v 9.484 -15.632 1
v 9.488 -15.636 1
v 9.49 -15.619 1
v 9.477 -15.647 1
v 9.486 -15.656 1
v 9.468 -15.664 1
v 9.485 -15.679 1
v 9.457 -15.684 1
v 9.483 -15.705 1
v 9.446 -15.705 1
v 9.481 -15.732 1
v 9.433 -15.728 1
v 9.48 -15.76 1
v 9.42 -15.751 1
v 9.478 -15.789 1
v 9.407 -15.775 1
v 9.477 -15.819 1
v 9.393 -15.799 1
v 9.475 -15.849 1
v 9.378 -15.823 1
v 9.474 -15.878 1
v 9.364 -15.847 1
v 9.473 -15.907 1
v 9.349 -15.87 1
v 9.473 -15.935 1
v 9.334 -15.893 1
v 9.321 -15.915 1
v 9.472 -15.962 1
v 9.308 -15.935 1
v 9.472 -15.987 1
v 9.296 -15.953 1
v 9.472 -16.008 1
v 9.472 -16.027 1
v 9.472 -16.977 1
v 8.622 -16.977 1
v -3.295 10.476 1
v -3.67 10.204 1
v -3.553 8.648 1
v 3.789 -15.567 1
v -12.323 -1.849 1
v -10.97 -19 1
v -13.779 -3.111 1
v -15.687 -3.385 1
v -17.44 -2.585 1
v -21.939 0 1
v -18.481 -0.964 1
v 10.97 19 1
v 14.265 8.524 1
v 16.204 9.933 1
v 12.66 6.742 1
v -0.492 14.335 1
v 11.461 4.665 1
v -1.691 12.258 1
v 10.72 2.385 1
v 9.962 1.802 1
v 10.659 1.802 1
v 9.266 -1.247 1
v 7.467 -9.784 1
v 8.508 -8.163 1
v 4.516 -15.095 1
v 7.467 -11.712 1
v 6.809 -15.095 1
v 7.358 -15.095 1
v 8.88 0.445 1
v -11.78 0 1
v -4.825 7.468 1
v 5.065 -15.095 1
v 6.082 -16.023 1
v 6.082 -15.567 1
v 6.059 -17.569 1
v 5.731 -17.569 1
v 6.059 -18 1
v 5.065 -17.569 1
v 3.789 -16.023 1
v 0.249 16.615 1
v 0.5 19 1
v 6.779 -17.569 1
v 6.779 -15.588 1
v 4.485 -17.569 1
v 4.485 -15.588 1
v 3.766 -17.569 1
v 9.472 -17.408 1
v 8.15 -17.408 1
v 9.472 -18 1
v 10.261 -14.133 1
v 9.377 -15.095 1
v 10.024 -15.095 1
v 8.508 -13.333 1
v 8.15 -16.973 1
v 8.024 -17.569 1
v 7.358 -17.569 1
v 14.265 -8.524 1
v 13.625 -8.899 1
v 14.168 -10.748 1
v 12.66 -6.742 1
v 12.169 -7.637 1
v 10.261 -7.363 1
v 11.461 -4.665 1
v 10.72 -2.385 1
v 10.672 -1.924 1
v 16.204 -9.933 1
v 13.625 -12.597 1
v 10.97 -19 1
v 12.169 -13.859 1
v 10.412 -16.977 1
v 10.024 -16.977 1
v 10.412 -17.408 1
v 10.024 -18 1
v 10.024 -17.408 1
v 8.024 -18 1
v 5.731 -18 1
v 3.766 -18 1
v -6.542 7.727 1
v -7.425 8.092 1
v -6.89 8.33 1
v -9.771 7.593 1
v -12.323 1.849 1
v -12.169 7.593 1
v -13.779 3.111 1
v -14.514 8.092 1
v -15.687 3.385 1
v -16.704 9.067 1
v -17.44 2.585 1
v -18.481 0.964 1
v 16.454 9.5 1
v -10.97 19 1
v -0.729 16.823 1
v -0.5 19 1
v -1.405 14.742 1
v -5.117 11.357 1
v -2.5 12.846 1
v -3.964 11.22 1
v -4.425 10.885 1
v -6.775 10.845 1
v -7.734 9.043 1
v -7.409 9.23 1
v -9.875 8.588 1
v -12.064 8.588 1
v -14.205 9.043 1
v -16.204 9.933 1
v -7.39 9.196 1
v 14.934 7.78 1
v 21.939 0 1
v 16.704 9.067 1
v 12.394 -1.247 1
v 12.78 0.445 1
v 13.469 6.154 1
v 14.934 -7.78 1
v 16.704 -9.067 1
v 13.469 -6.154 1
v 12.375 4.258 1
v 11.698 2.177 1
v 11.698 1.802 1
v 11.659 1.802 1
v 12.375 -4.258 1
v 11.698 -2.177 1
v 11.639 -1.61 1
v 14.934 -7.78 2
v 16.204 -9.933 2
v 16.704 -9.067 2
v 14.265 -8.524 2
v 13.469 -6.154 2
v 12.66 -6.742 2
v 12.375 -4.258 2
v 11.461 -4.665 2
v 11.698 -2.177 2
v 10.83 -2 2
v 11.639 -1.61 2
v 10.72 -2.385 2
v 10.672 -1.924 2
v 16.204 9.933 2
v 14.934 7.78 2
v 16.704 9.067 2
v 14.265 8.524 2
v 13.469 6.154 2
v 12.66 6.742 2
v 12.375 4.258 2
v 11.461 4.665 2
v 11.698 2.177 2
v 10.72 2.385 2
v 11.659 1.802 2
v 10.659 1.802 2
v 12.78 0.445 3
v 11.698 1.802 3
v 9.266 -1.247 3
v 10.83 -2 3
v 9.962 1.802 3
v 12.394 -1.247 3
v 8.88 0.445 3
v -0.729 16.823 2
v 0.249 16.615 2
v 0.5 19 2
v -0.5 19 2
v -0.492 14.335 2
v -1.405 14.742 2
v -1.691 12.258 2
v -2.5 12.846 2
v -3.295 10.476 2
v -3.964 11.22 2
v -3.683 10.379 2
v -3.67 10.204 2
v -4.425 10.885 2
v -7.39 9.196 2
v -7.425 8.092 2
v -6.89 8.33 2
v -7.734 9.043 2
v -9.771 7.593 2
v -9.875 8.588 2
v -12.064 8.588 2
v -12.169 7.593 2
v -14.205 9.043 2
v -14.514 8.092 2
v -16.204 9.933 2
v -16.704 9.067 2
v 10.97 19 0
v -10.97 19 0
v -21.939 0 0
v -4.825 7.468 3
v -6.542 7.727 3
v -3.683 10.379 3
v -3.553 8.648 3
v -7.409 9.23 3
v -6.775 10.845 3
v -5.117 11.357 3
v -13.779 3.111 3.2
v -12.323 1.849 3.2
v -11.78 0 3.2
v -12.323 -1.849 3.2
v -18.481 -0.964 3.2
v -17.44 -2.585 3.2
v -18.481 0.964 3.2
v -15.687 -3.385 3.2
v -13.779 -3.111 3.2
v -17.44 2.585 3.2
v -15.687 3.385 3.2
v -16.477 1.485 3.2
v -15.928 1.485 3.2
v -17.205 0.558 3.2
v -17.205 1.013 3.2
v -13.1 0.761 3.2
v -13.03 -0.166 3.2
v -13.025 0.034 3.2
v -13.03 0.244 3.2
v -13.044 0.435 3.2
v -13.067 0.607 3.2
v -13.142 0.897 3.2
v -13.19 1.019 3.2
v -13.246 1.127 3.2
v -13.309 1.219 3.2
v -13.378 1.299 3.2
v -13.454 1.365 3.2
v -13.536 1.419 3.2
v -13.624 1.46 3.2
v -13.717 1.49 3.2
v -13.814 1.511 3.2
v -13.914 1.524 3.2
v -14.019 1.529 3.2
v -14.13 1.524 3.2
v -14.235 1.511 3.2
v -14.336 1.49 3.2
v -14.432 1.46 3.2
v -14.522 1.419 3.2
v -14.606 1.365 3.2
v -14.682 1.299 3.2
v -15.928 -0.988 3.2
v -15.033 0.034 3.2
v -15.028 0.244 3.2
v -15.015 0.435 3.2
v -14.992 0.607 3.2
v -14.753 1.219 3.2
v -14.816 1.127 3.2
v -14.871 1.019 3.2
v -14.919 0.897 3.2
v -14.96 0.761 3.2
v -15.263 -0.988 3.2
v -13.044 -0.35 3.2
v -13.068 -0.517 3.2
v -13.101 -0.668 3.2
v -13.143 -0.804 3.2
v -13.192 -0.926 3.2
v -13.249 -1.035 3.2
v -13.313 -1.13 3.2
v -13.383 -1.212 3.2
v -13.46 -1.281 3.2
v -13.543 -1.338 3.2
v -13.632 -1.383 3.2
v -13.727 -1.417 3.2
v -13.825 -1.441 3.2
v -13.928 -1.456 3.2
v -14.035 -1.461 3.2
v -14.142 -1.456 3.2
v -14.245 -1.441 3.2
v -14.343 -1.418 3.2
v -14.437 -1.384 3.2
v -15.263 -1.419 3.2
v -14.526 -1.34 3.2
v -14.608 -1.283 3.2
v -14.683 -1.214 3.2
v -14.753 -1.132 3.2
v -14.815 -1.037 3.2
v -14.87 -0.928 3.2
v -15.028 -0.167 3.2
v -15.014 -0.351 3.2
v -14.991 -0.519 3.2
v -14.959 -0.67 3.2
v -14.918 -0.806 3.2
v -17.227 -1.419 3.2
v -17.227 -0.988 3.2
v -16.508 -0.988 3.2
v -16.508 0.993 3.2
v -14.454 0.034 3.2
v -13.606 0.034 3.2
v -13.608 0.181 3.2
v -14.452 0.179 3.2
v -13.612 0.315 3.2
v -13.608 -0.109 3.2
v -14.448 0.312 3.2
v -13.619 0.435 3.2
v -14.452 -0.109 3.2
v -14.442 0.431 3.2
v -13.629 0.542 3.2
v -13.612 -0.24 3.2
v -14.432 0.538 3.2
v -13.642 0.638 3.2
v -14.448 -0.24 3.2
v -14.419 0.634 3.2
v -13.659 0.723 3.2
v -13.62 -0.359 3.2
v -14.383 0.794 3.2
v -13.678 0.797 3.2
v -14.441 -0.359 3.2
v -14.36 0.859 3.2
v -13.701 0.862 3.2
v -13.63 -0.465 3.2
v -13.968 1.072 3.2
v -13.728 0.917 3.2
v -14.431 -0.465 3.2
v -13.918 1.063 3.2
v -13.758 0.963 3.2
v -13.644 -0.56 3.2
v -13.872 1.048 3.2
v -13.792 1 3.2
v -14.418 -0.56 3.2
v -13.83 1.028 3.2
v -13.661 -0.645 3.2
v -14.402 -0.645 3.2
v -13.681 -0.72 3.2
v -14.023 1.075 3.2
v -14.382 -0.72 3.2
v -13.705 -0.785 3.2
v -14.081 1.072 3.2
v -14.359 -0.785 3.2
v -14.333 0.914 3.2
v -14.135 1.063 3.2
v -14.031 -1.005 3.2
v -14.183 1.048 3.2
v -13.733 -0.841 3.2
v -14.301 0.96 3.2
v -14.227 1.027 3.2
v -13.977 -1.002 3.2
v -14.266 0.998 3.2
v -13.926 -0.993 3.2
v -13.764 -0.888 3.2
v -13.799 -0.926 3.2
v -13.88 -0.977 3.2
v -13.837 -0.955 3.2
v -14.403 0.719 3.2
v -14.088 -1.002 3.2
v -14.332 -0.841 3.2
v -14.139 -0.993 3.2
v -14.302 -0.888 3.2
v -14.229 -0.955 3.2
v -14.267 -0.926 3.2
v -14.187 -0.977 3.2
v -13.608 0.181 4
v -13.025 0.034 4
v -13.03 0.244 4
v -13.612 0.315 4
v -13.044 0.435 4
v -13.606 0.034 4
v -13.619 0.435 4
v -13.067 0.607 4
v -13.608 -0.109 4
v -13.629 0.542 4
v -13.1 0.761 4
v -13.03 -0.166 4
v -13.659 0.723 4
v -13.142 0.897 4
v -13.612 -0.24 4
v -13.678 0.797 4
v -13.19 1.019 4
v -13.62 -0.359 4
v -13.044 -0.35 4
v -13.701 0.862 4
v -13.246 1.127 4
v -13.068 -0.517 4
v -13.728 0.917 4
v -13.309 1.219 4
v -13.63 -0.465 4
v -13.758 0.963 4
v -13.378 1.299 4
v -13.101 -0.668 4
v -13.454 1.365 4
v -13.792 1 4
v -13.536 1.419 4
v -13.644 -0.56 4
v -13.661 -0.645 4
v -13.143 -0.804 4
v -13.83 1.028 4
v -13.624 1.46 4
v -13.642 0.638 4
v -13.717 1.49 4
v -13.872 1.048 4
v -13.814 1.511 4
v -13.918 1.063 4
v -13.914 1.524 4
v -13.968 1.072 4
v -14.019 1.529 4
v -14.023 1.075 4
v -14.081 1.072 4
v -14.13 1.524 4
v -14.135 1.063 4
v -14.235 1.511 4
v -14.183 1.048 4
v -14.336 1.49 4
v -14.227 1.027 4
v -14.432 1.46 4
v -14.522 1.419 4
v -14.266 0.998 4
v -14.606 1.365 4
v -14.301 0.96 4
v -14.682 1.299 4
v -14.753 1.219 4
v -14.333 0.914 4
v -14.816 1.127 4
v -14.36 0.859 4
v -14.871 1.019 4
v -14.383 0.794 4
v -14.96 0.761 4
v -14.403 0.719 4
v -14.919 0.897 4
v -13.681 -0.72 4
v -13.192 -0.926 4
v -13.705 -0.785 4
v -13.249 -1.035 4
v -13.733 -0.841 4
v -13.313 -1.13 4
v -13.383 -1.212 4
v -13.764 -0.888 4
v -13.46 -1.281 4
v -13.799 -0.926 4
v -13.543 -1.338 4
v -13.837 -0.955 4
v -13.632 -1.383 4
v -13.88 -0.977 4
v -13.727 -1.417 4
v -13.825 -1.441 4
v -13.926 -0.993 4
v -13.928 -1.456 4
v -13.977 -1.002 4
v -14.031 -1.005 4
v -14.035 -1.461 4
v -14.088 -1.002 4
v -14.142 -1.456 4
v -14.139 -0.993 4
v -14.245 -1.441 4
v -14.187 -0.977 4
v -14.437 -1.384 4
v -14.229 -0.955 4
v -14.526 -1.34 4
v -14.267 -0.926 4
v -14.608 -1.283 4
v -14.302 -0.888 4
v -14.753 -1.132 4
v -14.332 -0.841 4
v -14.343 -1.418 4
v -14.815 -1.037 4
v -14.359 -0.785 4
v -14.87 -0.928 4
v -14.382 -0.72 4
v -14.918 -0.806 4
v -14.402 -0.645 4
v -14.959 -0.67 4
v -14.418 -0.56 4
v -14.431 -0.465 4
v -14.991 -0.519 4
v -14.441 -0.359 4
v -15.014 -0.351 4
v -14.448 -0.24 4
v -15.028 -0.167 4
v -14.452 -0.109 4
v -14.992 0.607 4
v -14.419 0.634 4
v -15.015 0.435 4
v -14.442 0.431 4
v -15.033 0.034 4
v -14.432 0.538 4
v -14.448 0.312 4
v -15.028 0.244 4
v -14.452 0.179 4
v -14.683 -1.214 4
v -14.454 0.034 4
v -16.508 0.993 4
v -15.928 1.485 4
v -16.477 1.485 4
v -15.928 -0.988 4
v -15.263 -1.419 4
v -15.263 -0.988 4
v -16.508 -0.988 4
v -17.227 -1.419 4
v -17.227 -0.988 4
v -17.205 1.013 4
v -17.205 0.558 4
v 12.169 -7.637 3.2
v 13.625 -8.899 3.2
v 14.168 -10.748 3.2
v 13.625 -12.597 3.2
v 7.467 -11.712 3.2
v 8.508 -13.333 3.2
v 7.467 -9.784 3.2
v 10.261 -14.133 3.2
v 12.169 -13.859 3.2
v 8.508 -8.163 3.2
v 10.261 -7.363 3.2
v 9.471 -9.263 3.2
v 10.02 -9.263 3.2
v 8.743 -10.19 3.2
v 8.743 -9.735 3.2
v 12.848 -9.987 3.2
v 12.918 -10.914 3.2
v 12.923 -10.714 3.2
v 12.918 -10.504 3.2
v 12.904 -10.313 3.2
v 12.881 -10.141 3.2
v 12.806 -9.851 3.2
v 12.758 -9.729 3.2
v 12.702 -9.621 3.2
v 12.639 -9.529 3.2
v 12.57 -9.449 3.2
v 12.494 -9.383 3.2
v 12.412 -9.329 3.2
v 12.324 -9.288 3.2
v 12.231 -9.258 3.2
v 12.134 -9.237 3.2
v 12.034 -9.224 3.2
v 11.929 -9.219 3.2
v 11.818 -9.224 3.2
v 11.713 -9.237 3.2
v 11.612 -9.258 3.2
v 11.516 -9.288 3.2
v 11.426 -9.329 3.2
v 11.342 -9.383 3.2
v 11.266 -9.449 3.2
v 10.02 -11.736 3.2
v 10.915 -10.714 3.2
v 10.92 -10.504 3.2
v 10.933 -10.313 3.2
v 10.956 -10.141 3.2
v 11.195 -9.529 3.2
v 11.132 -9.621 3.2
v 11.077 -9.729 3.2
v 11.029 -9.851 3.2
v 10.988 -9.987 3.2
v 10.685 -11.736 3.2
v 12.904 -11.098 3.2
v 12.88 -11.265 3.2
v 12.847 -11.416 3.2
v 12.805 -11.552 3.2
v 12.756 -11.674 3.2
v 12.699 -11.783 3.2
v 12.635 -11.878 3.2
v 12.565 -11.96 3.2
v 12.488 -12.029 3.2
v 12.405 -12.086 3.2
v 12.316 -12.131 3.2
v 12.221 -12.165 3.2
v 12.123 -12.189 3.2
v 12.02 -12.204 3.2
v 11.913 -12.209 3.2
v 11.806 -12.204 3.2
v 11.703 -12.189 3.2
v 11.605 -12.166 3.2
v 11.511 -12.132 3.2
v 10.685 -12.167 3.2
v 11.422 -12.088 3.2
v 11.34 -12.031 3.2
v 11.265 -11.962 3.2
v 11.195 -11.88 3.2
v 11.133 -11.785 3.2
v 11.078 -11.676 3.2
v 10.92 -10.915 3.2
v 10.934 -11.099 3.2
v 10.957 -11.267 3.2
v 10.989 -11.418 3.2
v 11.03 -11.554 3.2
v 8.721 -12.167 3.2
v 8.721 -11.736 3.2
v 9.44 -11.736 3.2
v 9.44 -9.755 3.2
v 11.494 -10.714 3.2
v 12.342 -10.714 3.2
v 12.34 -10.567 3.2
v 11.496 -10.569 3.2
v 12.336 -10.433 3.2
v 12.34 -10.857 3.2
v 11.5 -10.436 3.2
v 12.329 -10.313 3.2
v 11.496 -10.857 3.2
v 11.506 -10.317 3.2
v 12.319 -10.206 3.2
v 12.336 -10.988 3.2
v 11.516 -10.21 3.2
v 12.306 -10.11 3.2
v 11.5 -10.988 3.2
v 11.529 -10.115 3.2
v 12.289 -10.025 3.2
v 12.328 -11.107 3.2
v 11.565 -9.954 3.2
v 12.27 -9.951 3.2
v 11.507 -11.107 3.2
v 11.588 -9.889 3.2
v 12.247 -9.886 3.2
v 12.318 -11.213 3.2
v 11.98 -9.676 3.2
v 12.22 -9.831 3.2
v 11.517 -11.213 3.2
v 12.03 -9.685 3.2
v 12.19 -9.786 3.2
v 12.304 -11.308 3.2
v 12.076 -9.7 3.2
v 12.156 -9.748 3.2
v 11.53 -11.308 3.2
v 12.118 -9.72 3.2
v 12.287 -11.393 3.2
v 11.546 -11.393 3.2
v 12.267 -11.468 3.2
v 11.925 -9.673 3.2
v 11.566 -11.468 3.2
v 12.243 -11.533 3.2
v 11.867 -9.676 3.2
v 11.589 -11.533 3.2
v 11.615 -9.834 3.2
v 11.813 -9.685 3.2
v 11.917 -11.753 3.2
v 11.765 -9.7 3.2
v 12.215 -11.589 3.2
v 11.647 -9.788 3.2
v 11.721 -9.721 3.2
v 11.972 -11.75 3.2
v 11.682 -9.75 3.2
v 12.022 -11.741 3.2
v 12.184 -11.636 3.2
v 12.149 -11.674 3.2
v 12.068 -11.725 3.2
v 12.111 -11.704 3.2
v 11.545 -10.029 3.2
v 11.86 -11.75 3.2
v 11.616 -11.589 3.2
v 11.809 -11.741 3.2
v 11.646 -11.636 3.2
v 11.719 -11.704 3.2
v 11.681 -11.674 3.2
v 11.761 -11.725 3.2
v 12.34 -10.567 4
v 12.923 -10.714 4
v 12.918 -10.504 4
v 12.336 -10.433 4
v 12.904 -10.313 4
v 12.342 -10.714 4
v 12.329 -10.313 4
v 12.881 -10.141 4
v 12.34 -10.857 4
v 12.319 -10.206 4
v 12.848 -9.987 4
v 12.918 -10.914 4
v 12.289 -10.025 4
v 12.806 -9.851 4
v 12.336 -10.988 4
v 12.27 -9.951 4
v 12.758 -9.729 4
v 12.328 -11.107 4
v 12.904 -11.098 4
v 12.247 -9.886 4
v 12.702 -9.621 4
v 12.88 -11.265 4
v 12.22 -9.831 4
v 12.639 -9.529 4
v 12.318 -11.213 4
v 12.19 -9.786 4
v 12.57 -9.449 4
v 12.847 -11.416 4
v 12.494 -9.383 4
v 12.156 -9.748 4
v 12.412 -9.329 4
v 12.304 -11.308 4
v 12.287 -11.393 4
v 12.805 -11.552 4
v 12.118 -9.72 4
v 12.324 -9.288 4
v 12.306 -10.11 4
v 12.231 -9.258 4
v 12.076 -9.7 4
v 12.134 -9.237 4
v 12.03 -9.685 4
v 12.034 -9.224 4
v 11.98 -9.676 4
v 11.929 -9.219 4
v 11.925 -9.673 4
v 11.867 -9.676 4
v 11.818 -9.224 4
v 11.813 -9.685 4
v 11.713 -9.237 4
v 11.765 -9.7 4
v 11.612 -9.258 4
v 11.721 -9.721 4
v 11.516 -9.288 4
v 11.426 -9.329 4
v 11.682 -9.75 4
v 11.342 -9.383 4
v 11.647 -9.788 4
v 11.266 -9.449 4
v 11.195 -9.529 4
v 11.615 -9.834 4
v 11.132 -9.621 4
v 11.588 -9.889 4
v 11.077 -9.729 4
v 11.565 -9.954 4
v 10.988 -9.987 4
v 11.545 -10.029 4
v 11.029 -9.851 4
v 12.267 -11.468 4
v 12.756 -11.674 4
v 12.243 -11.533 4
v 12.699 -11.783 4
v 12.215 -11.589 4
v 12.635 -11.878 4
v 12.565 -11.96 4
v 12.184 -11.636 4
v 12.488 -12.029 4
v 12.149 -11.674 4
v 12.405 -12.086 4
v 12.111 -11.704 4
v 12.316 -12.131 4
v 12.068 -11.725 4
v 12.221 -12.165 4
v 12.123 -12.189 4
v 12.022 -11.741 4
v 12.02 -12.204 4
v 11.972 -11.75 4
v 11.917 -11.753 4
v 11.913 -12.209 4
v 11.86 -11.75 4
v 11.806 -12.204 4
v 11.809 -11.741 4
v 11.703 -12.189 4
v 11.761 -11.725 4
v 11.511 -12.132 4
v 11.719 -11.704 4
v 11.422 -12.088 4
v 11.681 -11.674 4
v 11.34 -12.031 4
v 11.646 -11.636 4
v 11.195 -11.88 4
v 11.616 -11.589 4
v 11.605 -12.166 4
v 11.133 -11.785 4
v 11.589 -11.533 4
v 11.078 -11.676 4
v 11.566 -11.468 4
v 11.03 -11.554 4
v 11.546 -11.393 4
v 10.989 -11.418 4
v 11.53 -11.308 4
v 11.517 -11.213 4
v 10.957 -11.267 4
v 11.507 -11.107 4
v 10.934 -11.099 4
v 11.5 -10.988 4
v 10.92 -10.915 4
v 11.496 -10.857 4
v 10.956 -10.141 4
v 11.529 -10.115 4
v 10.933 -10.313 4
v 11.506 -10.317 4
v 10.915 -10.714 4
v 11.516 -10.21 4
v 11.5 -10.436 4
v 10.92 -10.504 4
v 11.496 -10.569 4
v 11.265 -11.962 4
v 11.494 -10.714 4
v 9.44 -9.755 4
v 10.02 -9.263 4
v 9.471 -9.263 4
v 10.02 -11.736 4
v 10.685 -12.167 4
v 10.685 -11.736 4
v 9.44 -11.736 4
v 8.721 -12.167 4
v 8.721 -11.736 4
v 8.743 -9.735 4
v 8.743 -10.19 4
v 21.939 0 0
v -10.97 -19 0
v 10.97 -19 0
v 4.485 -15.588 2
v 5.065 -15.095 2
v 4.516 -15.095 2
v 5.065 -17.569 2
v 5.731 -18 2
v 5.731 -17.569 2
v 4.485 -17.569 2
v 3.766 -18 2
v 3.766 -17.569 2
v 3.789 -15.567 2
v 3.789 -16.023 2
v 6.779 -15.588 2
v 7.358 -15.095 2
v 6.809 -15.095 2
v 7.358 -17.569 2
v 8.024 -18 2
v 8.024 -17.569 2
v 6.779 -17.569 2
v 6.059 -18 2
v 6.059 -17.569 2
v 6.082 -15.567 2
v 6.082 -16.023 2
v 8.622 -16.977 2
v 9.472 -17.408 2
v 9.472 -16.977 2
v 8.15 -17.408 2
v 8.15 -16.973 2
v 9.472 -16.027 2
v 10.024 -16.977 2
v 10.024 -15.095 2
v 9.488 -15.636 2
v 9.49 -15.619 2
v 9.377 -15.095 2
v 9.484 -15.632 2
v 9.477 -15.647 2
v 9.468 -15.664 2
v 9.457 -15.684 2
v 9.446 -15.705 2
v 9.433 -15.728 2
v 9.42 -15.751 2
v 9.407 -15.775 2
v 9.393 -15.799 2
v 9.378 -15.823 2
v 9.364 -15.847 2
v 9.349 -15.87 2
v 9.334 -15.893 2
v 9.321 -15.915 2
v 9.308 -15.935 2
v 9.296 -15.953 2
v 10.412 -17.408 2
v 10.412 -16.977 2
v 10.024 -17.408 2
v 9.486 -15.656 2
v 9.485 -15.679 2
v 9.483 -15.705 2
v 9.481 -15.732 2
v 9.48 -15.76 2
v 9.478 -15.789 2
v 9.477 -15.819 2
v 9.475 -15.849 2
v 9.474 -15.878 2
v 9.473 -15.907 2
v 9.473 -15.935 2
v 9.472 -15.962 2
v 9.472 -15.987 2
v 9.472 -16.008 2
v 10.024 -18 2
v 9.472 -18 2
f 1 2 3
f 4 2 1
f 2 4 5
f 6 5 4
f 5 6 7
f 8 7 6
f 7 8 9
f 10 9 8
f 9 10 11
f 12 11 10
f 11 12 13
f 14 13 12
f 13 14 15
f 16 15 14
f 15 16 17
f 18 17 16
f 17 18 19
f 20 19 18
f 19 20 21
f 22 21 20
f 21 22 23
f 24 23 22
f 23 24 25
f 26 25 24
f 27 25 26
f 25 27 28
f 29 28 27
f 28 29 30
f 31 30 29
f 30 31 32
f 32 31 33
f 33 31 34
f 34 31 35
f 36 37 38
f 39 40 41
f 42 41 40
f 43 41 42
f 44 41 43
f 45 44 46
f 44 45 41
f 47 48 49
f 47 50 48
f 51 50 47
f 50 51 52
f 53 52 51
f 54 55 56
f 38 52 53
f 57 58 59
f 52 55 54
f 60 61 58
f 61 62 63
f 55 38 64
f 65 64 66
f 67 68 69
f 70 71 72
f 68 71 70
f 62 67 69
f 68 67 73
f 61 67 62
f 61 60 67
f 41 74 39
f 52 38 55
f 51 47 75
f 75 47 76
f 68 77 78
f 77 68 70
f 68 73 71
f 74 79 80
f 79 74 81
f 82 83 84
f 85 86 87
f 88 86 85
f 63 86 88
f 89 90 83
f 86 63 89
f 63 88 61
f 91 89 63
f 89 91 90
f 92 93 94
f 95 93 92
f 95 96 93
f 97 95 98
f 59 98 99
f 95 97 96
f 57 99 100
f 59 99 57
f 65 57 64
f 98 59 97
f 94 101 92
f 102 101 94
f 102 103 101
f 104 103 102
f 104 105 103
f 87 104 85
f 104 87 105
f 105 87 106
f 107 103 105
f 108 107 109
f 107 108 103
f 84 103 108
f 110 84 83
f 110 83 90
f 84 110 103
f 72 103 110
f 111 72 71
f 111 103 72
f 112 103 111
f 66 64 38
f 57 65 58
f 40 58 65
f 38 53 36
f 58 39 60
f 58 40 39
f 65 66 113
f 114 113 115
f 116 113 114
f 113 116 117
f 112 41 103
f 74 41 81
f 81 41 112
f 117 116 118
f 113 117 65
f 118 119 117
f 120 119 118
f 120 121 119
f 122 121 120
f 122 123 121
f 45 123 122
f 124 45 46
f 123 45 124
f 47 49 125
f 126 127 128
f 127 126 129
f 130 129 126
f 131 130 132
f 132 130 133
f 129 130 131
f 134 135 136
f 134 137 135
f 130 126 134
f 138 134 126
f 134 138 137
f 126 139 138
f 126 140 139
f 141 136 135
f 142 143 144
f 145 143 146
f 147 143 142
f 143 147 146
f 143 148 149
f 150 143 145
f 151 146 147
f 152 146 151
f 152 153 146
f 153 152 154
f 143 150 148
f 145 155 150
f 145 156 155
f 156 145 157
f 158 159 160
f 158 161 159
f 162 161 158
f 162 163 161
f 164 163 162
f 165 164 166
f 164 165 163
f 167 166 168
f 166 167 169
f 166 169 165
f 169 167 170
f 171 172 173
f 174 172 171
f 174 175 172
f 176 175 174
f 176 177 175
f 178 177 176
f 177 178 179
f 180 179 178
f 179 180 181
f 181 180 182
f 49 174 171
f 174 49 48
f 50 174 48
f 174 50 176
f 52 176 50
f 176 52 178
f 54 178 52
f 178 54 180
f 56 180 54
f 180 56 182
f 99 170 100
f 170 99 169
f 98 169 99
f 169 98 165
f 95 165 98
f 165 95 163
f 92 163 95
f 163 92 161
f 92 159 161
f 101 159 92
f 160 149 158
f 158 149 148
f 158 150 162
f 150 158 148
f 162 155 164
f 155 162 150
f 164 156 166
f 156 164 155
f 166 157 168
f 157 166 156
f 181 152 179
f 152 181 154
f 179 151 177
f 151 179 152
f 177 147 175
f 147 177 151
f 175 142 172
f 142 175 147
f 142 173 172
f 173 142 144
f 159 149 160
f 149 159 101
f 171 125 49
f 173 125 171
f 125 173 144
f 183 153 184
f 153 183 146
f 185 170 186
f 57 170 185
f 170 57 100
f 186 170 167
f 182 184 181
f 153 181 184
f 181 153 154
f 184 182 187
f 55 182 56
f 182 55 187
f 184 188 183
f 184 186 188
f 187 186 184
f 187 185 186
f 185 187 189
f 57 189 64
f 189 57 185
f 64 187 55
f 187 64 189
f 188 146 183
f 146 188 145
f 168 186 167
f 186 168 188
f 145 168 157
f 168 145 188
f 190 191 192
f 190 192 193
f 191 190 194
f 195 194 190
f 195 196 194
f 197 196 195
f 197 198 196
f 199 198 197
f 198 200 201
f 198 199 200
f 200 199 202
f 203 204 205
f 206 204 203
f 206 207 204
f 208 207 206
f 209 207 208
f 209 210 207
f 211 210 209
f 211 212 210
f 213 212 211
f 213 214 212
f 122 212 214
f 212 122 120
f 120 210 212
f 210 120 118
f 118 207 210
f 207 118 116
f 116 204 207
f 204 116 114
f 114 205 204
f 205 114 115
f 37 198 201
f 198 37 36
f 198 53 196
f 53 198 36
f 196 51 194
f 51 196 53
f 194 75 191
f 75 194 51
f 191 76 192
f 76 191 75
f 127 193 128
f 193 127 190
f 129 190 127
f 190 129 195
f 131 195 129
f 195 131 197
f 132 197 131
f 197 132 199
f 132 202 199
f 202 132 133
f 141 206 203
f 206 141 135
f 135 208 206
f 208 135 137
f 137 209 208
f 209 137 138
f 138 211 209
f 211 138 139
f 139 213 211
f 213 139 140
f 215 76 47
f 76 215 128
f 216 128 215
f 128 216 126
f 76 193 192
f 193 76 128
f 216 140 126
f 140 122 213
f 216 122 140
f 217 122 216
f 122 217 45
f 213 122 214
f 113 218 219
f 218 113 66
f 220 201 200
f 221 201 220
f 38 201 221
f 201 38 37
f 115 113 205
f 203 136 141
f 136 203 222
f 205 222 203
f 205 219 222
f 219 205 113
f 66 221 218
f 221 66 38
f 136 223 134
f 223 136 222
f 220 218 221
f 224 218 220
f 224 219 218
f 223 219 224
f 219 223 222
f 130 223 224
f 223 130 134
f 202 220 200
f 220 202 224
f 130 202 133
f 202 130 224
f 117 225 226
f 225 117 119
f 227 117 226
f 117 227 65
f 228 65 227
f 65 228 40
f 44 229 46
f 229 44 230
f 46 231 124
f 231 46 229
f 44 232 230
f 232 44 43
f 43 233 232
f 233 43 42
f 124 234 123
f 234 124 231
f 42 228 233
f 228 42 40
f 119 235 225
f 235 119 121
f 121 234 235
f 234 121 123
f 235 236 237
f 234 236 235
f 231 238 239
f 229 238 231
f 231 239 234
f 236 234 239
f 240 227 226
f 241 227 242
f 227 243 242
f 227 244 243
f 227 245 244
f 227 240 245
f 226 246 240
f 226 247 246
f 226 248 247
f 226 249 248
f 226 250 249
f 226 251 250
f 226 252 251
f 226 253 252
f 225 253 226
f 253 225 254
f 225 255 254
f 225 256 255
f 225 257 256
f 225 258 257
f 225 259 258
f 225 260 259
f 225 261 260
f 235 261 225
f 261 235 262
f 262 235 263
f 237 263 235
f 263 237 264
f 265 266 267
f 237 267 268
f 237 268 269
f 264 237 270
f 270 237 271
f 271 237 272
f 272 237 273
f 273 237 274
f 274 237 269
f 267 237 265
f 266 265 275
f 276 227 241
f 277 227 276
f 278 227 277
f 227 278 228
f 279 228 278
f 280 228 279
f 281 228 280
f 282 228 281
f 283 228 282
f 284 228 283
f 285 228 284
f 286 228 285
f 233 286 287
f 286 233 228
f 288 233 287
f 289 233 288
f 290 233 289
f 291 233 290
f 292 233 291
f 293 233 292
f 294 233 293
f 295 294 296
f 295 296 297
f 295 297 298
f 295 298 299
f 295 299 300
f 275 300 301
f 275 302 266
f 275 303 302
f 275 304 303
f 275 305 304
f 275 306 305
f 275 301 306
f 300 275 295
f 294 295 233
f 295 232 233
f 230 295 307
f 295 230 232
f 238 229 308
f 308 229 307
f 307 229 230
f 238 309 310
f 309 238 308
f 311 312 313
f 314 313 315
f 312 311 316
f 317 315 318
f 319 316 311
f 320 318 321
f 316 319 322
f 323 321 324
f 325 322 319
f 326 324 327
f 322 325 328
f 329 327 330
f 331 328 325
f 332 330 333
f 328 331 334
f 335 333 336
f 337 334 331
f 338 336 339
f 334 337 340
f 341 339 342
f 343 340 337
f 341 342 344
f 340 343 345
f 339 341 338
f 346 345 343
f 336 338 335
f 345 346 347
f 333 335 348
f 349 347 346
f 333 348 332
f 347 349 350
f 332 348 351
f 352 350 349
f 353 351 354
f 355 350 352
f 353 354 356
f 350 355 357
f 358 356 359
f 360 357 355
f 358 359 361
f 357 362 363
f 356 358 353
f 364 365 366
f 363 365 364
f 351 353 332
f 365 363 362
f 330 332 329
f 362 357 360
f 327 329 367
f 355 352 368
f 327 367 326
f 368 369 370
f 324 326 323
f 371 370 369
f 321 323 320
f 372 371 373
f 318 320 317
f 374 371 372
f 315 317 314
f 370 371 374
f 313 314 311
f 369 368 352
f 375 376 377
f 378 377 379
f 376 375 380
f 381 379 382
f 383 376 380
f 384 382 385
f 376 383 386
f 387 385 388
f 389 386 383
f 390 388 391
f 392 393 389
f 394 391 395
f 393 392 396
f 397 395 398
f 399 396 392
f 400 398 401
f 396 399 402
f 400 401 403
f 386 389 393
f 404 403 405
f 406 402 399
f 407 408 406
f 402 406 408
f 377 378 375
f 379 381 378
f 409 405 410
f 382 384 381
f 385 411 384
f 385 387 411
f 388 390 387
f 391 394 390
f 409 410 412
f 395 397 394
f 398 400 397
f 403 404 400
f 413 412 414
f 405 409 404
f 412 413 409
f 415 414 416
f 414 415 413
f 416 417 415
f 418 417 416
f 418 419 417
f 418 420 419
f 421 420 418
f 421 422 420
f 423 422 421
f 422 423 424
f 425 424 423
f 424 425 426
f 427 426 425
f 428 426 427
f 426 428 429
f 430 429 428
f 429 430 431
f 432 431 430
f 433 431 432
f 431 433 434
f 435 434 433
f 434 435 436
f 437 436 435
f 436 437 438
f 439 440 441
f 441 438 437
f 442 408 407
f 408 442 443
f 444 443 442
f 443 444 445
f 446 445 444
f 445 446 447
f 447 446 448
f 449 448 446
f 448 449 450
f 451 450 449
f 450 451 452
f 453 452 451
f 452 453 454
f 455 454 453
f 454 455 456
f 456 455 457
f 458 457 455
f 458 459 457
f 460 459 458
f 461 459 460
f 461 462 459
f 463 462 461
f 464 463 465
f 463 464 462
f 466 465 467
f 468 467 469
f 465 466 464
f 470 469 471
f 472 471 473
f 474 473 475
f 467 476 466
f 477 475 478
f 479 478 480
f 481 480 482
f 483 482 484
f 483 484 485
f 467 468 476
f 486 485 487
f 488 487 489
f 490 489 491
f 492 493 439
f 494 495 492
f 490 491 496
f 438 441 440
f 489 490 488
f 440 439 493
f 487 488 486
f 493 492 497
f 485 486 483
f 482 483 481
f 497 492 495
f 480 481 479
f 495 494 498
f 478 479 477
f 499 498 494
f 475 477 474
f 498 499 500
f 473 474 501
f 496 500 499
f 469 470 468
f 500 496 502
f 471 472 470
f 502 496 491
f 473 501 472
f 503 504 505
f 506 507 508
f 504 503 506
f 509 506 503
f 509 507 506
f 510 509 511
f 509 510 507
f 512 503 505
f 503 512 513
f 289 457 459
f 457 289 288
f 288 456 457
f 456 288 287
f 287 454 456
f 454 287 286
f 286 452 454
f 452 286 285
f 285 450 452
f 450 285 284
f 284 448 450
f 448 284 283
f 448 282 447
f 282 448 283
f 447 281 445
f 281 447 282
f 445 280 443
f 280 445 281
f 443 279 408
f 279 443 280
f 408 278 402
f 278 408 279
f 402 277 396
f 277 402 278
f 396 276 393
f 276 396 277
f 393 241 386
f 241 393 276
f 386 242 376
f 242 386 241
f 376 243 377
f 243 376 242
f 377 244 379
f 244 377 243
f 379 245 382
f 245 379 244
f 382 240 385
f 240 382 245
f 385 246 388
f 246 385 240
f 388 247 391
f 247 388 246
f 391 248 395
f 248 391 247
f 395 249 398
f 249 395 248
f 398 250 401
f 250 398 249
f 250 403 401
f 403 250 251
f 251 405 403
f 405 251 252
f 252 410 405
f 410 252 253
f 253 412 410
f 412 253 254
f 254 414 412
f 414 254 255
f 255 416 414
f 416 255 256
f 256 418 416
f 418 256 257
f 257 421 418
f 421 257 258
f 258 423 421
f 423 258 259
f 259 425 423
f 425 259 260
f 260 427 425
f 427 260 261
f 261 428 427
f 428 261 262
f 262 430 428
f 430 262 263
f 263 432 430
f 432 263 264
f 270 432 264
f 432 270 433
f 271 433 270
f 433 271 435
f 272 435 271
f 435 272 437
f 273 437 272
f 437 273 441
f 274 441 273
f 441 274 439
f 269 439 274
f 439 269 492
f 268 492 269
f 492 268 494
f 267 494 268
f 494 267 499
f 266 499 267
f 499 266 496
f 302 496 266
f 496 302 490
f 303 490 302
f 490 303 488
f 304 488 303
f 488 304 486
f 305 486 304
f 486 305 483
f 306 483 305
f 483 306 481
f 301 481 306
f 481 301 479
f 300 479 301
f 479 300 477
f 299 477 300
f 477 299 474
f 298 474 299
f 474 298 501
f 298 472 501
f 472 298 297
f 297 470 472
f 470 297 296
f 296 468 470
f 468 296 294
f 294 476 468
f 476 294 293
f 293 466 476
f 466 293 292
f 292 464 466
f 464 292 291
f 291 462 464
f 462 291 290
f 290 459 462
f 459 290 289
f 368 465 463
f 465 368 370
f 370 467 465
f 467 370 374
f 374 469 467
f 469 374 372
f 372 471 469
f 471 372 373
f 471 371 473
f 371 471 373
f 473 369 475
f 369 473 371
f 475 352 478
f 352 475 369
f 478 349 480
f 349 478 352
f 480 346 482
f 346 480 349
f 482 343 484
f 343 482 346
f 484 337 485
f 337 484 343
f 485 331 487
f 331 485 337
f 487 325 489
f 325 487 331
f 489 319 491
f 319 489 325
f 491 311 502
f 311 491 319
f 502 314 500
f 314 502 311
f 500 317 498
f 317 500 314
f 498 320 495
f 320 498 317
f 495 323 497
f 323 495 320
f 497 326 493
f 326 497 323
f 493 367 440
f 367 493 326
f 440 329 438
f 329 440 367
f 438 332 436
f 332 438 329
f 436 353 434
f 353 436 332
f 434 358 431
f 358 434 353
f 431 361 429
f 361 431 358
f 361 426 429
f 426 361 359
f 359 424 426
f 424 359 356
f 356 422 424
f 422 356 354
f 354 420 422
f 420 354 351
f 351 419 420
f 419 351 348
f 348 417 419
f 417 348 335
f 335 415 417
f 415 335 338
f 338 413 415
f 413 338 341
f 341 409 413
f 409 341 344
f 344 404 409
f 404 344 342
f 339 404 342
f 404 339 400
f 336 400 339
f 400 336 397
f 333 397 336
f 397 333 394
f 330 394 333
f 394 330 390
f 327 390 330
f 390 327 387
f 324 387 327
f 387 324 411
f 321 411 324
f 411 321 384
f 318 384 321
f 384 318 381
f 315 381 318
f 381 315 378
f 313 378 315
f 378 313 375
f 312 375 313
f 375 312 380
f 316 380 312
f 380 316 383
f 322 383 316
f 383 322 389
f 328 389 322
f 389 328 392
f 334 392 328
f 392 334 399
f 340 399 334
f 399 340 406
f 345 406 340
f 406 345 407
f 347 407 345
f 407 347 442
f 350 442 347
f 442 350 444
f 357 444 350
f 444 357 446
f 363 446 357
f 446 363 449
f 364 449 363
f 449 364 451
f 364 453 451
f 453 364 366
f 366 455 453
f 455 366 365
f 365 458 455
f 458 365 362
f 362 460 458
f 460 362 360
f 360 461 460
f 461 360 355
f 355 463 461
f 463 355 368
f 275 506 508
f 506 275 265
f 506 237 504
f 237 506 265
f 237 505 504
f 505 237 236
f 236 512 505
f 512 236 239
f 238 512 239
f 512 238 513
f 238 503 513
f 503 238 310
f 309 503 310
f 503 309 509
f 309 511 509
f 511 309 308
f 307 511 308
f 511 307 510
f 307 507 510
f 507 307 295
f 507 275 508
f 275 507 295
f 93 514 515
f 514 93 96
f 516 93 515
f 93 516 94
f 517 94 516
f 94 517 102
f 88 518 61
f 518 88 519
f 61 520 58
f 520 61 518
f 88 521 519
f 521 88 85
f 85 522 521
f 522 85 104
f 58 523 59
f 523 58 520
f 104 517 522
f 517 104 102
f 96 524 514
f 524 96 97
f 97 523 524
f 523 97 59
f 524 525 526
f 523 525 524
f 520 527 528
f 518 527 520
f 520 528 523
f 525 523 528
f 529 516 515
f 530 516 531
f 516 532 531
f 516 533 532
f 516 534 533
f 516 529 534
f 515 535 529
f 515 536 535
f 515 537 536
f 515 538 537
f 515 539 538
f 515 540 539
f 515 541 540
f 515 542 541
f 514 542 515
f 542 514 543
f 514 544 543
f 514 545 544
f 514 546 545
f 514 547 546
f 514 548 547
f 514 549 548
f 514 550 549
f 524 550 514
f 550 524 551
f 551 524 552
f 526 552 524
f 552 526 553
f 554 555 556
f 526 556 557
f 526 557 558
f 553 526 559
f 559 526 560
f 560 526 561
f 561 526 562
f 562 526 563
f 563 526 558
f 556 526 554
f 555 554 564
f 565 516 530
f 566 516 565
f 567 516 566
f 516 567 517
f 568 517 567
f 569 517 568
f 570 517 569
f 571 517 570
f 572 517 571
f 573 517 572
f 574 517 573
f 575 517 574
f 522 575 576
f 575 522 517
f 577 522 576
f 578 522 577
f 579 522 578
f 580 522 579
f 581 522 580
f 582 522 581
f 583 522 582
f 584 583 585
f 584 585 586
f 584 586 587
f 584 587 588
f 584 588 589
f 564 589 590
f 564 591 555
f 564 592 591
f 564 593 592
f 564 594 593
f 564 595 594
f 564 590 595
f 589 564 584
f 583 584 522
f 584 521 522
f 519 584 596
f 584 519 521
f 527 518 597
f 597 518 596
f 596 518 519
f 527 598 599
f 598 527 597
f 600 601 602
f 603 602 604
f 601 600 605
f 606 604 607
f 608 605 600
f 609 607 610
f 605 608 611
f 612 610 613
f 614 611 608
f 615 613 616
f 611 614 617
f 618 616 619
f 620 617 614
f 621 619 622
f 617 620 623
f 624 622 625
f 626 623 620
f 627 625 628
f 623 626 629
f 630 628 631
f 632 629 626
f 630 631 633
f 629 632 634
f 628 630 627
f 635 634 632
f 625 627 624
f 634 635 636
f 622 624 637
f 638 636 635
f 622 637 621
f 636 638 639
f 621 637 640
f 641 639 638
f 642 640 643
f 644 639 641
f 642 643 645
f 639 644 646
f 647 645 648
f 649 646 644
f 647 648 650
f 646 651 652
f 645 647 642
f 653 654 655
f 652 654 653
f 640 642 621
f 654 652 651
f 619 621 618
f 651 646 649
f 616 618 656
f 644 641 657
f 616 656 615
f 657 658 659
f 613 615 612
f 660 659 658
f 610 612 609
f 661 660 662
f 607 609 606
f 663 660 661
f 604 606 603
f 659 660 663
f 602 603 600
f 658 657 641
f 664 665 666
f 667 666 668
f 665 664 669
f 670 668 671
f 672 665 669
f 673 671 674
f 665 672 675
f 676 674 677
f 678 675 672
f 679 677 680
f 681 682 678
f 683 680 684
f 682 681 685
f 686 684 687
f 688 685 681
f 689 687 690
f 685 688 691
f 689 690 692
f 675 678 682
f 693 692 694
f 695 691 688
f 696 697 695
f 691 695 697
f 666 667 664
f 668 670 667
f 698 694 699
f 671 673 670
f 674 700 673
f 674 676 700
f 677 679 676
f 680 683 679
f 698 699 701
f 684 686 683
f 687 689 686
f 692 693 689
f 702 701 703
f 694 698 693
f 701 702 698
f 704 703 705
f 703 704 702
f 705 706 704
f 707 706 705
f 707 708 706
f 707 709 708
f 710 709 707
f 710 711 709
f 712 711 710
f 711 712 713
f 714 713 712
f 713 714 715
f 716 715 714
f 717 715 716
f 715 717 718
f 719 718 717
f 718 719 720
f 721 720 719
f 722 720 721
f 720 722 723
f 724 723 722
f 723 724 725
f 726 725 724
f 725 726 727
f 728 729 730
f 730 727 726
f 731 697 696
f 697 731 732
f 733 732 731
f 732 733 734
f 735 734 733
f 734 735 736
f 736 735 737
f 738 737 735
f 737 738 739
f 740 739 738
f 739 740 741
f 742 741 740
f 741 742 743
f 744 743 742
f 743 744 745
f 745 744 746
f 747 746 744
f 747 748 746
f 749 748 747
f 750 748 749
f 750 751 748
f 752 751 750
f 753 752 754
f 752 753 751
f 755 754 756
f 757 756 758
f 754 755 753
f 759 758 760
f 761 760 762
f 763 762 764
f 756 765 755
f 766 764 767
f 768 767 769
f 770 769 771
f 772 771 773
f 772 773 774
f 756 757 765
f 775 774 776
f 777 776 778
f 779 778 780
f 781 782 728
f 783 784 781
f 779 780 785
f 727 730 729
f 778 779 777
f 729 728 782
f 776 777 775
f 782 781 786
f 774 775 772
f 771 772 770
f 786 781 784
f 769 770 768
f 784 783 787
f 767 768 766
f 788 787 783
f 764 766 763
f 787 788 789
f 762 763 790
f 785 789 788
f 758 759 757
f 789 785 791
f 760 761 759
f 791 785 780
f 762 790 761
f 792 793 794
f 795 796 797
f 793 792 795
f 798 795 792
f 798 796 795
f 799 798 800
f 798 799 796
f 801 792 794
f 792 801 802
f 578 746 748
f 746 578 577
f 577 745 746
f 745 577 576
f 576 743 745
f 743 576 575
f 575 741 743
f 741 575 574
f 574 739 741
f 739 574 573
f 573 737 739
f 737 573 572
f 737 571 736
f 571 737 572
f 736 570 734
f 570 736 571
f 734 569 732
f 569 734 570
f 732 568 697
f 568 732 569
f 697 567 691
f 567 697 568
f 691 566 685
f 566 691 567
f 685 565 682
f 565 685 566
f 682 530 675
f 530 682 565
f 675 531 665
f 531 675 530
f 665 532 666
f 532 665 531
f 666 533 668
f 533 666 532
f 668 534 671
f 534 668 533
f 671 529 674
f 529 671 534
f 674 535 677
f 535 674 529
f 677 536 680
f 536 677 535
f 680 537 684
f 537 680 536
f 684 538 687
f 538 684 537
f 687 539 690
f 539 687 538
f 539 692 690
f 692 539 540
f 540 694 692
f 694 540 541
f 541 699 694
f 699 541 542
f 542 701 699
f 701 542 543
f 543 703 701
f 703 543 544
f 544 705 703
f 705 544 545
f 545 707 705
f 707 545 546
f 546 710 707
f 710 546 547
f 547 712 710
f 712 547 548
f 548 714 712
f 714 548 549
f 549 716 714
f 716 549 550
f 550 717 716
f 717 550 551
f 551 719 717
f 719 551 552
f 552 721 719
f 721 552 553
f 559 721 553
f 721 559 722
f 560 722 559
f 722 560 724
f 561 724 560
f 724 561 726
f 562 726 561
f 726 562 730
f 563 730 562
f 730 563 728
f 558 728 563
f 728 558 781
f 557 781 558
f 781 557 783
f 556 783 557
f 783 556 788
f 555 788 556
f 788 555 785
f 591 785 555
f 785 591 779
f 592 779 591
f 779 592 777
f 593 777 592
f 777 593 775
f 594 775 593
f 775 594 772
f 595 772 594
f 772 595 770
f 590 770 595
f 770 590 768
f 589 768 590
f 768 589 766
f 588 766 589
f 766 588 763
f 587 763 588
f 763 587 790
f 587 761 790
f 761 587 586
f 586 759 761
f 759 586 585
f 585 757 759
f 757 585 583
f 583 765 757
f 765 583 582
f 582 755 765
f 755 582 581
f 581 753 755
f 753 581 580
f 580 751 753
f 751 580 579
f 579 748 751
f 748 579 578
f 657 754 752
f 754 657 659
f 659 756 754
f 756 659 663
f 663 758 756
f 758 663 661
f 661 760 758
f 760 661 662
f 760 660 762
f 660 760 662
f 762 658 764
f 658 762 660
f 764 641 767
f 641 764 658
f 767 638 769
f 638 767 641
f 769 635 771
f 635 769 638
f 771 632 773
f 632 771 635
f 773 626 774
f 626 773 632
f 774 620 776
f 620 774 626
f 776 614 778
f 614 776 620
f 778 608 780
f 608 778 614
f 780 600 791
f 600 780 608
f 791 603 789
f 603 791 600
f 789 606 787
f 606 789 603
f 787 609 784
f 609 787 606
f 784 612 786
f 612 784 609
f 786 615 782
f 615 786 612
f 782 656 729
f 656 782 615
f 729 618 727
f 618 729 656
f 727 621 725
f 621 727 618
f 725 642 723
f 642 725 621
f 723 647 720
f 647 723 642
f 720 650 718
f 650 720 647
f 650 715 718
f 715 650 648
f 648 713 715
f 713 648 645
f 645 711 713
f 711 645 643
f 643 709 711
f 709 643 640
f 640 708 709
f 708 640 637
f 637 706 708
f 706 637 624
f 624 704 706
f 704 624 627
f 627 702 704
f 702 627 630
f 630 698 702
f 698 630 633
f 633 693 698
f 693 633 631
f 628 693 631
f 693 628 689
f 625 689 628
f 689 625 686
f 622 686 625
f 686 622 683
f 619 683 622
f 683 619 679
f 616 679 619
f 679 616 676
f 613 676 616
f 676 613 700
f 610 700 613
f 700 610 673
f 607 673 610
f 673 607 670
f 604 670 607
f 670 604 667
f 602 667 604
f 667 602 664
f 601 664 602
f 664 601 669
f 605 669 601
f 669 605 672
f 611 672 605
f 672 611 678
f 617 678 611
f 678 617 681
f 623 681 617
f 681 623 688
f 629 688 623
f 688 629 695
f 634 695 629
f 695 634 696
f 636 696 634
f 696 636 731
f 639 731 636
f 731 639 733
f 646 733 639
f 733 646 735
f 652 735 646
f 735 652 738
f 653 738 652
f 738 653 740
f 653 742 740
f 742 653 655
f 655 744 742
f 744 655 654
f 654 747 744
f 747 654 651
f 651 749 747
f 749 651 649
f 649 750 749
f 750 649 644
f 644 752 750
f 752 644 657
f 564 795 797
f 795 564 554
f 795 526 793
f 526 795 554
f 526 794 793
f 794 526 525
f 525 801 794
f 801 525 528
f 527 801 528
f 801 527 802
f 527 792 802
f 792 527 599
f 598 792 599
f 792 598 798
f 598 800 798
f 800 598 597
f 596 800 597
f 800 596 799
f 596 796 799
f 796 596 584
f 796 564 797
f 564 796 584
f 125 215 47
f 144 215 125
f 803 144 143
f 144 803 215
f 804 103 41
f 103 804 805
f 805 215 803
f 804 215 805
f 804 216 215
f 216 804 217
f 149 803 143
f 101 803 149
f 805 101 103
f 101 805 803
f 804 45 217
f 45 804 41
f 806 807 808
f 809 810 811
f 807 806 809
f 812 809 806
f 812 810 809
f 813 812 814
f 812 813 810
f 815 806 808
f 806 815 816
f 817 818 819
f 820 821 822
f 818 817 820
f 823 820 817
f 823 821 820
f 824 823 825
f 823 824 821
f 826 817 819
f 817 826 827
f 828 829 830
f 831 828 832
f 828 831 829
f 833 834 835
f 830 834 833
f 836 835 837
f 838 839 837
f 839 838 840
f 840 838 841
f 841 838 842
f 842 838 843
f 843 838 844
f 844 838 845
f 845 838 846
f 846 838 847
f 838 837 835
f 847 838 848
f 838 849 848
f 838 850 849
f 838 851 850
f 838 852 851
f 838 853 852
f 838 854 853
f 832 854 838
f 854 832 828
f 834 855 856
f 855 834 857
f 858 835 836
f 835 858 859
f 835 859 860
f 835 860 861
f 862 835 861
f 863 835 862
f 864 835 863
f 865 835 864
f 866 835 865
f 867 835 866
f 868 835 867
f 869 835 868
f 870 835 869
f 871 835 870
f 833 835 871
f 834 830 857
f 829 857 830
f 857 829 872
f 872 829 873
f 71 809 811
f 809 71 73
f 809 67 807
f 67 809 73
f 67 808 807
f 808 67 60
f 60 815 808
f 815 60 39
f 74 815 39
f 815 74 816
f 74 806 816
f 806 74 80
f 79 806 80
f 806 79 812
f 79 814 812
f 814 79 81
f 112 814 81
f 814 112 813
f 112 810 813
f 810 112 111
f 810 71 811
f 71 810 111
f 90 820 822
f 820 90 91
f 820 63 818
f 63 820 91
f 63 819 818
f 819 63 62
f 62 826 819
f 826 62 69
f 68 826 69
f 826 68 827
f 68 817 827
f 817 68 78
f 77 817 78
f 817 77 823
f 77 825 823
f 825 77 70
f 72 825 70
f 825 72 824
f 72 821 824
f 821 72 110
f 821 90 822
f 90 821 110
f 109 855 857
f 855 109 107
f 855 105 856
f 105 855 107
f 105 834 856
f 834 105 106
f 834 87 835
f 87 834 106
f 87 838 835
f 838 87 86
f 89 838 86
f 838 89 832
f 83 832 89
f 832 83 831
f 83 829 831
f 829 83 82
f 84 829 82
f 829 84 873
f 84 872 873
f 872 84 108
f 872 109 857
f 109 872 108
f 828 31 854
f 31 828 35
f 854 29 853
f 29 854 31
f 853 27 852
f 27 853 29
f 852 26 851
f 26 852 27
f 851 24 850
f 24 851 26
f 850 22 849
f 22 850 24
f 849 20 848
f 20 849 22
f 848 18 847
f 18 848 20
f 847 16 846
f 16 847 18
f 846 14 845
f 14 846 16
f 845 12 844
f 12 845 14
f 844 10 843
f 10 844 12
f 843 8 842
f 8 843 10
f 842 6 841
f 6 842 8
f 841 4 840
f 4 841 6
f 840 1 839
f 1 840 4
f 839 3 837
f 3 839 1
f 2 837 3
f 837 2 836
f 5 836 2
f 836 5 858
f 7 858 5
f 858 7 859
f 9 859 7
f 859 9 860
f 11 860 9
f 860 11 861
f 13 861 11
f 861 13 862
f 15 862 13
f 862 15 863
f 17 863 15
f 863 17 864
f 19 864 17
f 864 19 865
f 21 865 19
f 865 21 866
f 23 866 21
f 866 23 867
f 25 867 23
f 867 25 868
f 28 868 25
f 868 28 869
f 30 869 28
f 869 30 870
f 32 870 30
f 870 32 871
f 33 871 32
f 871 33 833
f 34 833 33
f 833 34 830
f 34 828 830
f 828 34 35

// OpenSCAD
include <../Scripts/18xx tiles basic functions.scad>
hex();
put_tilenr("114");
small_town_sharp_curve(r=1);
small_town_sharp_curve(r=3);
put_value("10",-90);
put_value("10",135);
